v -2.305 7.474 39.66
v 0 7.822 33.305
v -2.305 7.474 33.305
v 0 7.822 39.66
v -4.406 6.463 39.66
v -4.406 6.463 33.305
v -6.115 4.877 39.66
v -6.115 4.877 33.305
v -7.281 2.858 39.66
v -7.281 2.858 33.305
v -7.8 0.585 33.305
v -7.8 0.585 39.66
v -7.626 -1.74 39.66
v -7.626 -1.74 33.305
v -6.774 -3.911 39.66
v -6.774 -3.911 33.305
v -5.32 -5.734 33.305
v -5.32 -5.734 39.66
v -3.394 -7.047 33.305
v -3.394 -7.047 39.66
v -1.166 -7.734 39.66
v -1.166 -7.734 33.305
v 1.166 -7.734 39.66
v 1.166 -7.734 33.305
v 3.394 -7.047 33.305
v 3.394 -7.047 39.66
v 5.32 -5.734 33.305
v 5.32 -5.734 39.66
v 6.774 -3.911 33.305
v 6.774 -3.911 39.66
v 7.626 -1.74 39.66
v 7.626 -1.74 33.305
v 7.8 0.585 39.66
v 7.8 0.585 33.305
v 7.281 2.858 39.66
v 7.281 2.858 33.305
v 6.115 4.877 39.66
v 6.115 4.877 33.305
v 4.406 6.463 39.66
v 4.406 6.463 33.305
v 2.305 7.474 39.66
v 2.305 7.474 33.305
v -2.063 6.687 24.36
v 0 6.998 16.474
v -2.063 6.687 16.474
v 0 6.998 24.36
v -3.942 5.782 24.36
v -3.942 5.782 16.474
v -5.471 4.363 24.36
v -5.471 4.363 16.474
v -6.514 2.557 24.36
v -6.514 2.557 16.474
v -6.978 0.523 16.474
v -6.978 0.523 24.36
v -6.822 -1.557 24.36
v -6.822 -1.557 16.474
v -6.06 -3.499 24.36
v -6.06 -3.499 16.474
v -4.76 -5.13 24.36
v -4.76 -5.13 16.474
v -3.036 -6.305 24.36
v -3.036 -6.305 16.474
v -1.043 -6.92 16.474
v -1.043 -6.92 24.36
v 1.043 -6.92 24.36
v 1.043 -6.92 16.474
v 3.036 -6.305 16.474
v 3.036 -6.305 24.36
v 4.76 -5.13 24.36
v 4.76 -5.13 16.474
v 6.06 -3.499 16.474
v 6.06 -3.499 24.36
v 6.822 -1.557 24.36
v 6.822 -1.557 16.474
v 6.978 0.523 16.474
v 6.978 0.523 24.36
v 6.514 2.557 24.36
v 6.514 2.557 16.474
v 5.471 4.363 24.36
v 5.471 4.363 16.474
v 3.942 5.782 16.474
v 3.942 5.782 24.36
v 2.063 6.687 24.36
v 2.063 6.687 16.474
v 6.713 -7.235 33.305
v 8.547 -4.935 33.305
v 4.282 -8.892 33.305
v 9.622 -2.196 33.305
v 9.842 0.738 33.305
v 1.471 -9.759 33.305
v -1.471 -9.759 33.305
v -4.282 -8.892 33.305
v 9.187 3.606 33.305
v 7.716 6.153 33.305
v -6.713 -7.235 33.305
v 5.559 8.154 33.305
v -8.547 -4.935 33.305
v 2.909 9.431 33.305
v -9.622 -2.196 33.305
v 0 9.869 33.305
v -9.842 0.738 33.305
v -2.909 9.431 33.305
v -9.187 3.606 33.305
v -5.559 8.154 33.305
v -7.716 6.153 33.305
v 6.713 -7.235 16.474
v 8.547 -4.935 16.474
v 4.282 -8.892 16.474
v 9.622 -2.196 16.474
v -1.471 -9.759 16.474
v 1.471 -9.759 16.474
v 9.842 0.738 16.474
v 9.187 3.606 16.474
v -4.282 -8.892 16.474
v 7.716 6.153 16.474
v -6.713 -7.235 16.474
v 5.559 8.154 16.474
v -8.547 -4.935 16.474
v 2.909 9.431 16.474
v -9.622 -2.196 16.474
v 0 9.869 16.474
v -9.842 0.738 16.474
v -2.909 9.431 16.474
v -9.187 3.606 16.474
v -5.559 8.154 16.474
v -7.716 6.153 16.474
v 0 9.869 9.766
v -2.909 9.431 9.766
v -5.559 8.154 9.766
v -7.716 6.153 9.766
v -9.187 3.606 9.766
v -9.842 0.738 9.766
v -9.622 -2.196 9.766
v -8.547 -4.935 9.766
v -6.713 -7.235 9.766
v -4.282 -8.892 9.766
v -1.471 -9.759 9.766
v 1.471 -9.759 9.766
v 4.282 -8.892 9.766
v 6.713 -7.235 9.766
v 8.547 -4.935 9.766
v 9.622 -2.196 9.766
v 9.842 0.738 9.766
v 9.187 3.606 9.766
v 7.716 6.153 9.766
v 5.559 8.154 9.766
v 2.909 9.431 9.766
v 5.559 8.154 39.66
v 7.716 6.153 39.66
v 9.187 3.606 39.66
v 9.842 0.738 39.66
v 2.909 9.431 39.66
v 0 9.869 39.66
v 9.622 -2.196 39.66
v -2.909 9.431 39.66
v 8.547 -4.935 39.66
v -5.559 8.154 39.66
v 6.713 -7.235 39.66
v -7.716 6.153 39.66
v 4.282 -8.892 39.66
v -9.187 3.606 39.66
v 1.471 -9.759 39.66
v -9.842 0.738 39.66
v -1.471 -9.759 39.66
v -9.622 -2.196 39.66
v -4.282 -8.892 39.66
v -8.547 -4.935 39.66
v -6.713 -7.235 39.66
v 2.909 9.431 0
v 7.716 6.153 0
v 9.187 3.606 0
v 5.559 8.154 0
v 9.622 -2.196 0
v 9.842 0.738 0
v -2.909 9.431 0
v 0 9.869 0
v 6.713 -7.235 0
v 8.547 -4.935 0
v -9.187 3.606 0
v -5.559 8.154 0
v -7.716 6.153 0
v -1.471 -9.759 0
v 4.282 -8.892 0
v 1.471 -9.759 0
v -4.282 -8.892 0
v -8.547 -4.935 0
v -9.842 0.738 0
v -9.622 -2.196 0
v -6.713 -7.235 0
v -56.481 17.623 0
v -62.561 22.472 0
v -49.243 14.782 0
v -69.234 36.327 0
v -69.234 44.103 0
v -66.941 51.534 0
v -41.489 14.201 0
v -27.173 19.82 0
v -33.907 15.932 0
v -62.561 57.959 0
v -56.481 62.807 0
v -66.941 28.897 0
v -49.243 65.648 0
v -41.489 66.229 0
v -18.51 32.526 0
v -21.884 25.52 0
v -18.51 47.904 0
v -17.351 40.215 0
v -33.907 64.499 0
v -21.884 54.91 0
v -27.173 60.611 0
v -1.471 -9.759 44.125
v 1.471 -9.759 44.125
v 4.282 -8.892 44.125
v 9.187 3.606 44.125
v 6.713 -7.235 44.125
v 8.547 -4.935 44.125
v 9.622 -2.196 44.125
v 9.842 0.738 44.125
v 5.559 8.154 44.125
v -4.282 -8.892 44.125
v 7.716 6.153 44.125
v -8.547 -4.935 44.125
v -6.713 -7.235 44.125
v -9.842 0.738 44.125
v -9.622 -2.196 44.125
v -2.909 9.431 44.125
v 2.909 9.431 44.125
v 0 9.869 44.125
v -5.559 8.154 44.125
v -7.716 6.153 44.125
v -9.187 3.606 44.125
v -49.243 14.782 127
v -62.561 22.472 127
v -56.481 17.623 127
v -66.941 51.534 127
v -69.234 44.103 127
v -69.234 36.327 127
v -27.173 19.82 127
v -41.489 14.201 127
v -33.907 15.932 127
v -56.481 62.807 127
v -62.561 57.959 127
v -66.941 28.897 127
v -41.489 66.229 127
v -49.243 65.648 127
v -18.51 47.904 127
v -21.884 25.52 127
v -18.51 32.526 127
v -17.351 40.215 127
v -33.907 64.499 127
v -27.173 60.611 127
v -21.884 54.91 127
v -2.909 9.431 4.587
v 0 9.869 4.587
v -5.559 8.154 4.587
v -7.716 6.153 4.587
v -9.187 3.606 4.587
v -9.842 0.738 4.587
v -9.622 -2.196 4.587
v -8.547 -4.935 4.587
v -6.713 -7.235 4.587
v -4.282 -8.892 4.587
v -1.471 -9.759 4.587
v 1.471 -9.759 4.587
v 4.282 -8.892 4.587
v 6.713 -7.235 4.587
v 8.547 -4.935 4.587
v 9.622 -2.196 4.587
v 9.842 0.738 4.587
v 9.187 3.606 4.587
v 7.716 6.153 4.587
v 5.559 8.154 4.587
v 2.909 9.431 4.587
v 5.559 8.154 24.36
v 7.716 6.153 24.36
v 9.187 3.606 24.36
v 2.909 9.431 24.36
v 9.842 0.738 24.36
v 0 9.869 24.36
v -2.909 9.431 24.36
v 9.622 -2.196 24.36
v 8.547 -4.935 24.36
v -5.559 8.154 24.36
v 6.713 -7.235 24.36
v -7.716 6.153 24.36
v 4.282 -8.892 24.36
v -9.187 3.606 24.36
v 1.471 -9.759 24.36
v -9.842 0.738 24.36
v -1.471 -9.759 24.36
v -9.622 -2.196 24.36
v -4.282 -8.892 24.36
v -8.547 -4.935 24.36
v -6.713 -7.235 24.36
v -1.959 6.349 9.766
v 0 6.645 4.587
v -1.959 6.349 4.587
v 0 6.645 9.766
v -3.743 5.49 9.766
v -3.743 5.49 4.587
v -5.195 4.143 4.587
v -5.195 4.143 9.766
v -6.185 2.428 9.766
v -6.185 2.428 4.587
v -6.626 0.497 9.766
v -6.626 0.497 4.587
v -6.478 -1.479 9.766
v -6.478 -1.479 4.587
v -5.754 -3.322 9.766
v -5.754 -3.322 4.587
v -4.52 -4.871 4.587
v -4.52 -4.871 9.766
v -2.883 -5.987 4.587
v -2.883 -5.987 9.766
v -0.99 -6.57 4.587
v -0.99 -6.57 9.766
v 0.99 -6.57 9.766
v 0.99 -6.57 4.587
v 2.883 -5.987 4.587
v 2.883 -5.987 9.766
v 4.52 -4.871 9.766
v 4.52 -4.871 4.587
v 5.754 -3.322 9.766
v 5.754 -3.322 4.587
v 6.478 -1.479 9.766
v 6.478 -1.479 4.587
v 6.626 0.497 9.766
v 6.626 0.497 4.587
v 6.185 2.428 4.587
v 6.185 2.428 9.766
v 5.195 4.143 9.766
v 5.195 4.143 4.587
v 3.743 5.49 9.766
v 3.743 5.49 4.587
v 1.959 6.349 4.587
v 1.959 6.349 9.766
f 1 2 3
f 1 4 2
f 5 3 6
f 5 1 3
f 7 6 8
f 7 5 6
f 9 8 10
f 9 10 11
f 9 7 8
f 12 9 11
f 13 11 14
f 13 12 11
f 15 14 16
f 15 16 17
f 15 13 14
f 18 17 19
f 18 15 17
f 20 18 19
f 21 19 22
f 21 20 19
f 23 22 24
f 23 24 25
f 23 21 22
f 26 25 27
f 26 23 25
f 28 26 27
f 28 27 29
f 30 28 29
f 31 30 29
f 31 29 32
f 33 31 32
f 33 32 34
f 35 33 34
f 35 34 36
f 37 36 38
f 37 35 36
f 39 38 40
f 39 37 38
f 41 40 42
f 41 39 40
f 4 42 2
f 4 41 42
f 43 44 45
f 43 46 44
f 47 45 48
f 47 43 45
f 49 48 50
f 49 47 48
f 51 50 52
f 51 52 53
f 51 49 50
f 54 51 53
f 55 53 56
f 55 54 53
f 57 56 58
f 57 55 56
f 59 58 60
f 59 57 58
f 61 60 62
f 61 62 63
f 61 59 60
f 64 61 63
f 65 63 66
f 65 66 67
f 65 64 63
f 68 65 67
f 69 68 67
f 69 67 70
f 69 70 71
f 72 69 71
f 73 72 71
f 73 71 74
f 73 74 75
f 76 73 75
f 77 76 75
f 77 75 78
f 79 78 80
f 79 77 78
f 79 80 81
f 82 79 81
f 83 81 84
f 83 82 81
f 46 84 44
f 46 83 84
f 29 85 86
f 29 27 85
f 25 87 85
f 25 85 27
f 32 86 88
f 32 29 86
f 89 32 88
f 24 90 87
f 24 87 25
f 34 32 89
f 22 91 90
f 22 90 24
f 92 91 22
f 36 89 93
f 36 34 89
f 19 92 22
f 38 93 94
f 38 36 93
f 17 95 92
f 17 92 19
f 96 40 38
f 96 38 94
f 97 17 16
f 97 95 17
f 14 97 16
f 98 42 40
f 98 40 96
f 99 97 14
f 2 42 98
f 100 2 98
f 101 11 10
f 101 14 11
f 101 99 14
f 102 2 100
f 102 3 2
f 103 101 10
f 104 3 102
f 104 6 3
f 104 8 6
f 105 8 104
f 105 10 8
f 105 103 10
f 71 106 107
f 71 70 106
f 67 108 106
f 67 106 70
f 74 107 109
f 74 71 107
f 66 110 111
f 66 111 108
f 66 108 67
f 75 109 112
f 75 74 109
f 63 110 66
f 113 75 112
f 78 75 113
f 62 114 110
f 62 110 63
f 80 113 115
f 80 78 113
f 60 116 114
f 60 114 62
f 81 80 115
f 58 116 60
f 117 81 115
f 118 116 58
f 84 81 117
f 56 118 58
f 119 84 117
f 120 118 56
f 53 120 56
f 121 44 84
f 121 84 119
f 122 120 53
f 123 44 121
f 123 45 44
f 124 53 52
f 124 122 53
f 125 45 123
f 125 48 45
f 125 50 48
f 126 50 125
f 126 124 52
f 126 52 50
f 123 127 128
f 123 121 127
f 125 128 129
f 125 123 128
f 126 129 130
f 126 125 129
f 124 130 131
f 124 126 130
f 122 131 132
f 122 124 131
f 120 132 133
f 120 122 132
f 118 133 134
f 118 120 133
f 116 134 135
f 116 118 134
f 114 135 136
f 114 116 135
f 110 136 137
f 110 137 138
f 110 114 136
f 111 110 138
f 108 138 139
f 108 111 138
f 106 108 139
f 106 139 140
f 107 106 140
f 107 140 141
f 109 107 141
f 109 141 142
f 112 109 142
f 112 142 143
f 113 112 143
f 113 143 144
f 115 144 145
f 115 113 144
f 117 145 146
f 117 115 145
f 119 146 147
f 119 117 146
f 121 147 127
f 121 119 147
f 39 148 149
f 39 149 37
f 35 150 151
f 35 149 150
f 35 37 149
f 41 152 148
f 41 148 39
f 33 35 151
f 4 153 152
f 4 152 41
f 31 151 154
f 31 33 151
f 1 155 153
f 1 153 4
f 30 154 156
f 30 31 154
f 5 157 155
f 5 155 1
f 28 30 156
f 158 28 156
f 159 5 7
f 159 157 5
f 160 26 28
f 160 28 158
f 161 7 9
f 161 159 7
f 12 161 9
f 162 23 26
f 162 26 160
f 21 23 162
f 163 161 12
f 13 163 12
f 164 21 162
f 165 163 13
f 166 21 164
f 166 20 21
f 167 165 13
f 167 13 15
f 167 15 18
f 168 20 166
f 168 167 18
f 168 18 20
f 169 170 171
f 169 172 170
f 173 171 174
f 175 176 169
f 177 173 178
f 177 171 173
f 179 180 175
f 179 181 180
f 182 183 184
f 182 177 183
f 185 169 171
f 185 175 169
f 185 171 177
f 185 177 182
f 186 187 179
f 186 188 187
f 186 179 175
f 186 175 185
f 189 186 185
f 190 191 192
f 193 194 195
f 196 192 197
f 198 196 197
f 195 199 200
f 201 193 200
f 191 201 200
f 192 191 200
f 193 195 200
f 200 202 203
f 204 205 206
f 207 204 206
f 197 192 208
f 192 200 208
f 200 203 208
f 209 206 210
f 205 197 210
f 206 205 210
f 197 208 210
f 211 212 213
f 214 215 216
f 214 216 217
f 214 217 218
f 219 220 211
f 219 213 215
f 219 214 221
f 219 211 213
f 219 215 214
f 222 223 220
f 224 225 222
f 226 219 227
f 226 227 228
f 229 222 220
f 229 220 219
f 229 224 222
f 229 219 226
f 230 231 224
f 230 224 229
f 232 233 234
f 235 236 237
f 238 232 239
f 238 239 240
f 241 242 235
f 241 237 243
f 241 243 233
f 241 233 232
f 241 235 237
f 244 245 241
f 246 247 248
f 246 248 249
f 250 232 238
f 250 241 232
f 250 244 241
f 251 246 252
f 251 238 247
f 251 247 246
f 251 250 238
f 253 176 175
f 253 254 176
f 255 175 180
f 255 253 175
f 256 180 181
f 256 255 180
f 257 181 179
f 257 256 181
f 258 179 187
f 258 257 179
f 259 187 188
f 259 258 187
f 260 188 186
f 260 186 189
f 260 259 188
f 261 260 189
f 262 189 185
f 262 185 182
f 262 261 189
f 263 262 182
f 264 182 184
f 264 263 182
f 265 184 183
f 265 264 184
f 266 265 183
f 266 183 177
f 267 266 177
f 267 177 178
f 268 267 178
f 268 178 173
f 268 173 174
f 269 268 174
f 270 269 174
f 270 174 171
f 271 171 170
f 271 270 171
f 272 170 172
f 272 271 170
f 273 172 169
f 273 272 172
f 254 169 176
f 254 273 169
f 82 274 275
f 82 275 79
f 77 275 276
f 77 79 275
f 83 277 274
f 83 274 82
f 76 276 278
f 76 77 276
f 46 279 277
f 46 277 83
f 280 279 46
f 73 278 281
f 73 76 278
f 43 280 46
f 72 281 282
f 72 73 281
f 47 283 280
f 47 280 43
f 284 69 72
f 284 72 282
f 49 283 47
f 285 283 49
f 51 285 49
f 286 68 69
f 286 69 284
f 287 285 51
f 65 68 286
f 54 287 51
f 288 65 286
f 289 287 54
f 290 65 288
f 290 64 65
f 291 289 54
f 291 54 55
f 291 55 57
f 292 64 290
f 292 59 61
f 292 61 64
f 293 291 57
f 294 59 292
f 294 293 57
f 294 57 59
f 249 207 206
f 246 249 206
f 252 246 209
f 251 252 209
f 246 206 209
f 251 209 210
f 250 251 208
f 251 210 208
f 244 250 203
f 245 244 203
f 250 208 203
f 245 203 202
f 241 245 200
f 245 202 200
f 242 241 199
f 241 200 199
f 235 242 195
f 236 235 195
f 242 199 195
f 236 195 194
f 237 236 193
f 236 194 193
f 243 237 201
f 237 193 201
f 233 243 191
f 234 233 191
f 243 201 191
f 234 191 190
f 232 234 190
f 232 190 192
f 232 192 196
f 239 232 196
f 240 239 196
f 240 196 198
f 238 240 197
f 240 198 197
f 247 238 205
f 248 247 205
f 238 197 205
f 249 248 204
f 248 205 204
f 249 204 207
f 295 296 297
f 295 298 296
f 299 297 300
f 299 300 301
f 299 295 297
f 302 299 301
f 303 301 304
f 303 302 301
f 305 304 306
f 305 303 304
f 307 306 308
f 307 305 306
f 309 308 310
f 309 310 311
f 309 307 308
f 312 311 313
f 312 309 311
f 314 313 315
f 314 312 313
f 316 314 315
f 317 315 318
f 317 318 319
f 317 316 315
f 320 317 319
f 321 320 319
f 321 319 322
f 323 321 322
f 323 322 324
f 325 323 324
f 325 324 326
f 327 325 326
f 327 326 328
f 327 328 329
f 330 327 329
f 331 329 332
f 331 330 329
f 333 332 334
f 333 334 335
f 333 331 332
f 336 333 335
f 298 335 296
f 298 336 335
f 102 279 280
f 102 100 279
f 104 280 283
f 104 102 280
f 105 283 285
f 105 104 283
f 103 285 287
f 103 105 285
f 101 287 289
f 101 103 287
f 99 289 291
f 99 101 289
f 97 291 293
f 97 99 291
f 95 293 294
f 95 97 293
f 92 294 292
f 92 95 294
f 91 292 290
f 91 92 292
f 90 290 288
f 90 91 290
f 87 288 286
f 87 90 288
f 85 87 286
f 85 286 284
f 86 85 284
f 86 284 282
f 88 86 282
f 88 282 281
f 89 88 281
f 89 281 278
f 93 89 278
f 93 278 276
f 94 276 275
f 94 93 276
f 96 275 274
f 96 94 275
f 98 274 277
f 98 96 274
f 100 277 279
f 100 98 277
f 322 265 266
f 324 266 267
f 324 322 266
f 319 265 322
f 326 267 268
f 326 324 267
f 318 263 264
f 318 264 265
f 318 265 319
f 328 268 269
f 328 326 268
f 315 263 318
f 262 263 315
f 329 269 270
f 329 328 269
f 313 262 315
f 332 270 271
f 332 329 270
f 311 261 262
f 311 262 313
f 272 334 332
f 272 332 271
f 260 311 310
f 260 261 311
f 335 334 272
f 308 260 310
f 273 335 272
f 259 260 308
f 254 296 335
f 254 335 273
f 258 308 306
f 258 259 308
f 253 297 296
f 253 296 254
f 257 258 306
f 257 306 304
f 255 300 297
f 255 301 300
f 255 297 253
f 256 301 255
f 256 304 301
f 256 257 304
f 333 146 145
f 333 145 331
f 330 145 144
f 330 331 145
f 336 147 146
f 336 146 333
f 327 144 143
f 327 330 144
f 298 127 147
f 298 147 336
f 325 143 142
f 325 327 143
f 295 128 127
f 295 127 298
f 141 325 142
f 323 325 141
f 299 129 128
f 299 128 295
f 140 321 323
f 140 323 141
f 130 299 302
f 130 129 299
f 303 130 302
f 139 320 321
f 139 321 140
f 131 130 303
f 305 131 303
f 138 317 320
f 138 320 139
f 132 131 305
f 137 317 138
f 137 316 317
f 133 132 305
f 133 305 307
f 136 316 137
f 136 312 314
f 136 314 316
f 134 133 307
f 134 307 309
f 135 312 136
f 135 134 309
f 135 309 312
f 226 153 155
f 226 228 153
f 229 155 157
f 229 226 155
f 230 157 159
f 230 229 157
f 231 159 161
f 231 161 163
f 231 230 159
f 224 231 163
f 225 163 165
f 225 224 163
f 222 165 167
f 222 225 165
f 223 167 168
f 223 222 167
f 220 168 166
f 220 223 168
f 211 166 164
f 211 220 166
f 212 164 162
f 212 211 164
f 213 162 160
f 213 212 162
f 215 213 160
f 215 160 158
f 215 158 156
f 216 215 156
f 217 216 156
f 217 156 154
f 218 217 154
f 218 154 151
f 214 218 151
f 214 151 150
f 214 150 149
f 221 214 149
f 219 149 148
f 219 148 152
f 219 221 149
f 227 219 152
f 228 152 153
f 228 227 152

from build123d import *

# Parameters (mm, degrees)
F0_R     = 26.086896
F1_DEPTH = 127


with BuildPart() as f1:
    # F0 (on Top) → F1 (new body)
    with BuildSketch(Plane.XY):
        with Locations((-43.438002, 40.215183)):
            Circle(F0_R)
    extrude(amount=F1_DEPTH)


with BuildPart() as f3:
    # F2 (on Right) → F3 (revolve)
    with BuildSketch(Plane.YZ):
        Polygon((0, 44.125024), (0, 0), (9.869096, 0), (9.869096, 4.587108), (6.644674, 4.587108), (6.644674, 9.765715), (9.869096, 9.765715), (9.869096, 16.474364), (6.997761, 16.474364), (6.997761, 24.359971), (9.869096, 24.359971), (9.869096, 33.304837), (7.82163, 33.304837), (7.82163, 39.660398), (9.869096, 39.660398), (9.869096, 44.125024), align=None)
    revolve(axis=Axis((0, 0, 22.062512), (0, 0, 1)))


solid = Compound([f1.part, f3.part])
